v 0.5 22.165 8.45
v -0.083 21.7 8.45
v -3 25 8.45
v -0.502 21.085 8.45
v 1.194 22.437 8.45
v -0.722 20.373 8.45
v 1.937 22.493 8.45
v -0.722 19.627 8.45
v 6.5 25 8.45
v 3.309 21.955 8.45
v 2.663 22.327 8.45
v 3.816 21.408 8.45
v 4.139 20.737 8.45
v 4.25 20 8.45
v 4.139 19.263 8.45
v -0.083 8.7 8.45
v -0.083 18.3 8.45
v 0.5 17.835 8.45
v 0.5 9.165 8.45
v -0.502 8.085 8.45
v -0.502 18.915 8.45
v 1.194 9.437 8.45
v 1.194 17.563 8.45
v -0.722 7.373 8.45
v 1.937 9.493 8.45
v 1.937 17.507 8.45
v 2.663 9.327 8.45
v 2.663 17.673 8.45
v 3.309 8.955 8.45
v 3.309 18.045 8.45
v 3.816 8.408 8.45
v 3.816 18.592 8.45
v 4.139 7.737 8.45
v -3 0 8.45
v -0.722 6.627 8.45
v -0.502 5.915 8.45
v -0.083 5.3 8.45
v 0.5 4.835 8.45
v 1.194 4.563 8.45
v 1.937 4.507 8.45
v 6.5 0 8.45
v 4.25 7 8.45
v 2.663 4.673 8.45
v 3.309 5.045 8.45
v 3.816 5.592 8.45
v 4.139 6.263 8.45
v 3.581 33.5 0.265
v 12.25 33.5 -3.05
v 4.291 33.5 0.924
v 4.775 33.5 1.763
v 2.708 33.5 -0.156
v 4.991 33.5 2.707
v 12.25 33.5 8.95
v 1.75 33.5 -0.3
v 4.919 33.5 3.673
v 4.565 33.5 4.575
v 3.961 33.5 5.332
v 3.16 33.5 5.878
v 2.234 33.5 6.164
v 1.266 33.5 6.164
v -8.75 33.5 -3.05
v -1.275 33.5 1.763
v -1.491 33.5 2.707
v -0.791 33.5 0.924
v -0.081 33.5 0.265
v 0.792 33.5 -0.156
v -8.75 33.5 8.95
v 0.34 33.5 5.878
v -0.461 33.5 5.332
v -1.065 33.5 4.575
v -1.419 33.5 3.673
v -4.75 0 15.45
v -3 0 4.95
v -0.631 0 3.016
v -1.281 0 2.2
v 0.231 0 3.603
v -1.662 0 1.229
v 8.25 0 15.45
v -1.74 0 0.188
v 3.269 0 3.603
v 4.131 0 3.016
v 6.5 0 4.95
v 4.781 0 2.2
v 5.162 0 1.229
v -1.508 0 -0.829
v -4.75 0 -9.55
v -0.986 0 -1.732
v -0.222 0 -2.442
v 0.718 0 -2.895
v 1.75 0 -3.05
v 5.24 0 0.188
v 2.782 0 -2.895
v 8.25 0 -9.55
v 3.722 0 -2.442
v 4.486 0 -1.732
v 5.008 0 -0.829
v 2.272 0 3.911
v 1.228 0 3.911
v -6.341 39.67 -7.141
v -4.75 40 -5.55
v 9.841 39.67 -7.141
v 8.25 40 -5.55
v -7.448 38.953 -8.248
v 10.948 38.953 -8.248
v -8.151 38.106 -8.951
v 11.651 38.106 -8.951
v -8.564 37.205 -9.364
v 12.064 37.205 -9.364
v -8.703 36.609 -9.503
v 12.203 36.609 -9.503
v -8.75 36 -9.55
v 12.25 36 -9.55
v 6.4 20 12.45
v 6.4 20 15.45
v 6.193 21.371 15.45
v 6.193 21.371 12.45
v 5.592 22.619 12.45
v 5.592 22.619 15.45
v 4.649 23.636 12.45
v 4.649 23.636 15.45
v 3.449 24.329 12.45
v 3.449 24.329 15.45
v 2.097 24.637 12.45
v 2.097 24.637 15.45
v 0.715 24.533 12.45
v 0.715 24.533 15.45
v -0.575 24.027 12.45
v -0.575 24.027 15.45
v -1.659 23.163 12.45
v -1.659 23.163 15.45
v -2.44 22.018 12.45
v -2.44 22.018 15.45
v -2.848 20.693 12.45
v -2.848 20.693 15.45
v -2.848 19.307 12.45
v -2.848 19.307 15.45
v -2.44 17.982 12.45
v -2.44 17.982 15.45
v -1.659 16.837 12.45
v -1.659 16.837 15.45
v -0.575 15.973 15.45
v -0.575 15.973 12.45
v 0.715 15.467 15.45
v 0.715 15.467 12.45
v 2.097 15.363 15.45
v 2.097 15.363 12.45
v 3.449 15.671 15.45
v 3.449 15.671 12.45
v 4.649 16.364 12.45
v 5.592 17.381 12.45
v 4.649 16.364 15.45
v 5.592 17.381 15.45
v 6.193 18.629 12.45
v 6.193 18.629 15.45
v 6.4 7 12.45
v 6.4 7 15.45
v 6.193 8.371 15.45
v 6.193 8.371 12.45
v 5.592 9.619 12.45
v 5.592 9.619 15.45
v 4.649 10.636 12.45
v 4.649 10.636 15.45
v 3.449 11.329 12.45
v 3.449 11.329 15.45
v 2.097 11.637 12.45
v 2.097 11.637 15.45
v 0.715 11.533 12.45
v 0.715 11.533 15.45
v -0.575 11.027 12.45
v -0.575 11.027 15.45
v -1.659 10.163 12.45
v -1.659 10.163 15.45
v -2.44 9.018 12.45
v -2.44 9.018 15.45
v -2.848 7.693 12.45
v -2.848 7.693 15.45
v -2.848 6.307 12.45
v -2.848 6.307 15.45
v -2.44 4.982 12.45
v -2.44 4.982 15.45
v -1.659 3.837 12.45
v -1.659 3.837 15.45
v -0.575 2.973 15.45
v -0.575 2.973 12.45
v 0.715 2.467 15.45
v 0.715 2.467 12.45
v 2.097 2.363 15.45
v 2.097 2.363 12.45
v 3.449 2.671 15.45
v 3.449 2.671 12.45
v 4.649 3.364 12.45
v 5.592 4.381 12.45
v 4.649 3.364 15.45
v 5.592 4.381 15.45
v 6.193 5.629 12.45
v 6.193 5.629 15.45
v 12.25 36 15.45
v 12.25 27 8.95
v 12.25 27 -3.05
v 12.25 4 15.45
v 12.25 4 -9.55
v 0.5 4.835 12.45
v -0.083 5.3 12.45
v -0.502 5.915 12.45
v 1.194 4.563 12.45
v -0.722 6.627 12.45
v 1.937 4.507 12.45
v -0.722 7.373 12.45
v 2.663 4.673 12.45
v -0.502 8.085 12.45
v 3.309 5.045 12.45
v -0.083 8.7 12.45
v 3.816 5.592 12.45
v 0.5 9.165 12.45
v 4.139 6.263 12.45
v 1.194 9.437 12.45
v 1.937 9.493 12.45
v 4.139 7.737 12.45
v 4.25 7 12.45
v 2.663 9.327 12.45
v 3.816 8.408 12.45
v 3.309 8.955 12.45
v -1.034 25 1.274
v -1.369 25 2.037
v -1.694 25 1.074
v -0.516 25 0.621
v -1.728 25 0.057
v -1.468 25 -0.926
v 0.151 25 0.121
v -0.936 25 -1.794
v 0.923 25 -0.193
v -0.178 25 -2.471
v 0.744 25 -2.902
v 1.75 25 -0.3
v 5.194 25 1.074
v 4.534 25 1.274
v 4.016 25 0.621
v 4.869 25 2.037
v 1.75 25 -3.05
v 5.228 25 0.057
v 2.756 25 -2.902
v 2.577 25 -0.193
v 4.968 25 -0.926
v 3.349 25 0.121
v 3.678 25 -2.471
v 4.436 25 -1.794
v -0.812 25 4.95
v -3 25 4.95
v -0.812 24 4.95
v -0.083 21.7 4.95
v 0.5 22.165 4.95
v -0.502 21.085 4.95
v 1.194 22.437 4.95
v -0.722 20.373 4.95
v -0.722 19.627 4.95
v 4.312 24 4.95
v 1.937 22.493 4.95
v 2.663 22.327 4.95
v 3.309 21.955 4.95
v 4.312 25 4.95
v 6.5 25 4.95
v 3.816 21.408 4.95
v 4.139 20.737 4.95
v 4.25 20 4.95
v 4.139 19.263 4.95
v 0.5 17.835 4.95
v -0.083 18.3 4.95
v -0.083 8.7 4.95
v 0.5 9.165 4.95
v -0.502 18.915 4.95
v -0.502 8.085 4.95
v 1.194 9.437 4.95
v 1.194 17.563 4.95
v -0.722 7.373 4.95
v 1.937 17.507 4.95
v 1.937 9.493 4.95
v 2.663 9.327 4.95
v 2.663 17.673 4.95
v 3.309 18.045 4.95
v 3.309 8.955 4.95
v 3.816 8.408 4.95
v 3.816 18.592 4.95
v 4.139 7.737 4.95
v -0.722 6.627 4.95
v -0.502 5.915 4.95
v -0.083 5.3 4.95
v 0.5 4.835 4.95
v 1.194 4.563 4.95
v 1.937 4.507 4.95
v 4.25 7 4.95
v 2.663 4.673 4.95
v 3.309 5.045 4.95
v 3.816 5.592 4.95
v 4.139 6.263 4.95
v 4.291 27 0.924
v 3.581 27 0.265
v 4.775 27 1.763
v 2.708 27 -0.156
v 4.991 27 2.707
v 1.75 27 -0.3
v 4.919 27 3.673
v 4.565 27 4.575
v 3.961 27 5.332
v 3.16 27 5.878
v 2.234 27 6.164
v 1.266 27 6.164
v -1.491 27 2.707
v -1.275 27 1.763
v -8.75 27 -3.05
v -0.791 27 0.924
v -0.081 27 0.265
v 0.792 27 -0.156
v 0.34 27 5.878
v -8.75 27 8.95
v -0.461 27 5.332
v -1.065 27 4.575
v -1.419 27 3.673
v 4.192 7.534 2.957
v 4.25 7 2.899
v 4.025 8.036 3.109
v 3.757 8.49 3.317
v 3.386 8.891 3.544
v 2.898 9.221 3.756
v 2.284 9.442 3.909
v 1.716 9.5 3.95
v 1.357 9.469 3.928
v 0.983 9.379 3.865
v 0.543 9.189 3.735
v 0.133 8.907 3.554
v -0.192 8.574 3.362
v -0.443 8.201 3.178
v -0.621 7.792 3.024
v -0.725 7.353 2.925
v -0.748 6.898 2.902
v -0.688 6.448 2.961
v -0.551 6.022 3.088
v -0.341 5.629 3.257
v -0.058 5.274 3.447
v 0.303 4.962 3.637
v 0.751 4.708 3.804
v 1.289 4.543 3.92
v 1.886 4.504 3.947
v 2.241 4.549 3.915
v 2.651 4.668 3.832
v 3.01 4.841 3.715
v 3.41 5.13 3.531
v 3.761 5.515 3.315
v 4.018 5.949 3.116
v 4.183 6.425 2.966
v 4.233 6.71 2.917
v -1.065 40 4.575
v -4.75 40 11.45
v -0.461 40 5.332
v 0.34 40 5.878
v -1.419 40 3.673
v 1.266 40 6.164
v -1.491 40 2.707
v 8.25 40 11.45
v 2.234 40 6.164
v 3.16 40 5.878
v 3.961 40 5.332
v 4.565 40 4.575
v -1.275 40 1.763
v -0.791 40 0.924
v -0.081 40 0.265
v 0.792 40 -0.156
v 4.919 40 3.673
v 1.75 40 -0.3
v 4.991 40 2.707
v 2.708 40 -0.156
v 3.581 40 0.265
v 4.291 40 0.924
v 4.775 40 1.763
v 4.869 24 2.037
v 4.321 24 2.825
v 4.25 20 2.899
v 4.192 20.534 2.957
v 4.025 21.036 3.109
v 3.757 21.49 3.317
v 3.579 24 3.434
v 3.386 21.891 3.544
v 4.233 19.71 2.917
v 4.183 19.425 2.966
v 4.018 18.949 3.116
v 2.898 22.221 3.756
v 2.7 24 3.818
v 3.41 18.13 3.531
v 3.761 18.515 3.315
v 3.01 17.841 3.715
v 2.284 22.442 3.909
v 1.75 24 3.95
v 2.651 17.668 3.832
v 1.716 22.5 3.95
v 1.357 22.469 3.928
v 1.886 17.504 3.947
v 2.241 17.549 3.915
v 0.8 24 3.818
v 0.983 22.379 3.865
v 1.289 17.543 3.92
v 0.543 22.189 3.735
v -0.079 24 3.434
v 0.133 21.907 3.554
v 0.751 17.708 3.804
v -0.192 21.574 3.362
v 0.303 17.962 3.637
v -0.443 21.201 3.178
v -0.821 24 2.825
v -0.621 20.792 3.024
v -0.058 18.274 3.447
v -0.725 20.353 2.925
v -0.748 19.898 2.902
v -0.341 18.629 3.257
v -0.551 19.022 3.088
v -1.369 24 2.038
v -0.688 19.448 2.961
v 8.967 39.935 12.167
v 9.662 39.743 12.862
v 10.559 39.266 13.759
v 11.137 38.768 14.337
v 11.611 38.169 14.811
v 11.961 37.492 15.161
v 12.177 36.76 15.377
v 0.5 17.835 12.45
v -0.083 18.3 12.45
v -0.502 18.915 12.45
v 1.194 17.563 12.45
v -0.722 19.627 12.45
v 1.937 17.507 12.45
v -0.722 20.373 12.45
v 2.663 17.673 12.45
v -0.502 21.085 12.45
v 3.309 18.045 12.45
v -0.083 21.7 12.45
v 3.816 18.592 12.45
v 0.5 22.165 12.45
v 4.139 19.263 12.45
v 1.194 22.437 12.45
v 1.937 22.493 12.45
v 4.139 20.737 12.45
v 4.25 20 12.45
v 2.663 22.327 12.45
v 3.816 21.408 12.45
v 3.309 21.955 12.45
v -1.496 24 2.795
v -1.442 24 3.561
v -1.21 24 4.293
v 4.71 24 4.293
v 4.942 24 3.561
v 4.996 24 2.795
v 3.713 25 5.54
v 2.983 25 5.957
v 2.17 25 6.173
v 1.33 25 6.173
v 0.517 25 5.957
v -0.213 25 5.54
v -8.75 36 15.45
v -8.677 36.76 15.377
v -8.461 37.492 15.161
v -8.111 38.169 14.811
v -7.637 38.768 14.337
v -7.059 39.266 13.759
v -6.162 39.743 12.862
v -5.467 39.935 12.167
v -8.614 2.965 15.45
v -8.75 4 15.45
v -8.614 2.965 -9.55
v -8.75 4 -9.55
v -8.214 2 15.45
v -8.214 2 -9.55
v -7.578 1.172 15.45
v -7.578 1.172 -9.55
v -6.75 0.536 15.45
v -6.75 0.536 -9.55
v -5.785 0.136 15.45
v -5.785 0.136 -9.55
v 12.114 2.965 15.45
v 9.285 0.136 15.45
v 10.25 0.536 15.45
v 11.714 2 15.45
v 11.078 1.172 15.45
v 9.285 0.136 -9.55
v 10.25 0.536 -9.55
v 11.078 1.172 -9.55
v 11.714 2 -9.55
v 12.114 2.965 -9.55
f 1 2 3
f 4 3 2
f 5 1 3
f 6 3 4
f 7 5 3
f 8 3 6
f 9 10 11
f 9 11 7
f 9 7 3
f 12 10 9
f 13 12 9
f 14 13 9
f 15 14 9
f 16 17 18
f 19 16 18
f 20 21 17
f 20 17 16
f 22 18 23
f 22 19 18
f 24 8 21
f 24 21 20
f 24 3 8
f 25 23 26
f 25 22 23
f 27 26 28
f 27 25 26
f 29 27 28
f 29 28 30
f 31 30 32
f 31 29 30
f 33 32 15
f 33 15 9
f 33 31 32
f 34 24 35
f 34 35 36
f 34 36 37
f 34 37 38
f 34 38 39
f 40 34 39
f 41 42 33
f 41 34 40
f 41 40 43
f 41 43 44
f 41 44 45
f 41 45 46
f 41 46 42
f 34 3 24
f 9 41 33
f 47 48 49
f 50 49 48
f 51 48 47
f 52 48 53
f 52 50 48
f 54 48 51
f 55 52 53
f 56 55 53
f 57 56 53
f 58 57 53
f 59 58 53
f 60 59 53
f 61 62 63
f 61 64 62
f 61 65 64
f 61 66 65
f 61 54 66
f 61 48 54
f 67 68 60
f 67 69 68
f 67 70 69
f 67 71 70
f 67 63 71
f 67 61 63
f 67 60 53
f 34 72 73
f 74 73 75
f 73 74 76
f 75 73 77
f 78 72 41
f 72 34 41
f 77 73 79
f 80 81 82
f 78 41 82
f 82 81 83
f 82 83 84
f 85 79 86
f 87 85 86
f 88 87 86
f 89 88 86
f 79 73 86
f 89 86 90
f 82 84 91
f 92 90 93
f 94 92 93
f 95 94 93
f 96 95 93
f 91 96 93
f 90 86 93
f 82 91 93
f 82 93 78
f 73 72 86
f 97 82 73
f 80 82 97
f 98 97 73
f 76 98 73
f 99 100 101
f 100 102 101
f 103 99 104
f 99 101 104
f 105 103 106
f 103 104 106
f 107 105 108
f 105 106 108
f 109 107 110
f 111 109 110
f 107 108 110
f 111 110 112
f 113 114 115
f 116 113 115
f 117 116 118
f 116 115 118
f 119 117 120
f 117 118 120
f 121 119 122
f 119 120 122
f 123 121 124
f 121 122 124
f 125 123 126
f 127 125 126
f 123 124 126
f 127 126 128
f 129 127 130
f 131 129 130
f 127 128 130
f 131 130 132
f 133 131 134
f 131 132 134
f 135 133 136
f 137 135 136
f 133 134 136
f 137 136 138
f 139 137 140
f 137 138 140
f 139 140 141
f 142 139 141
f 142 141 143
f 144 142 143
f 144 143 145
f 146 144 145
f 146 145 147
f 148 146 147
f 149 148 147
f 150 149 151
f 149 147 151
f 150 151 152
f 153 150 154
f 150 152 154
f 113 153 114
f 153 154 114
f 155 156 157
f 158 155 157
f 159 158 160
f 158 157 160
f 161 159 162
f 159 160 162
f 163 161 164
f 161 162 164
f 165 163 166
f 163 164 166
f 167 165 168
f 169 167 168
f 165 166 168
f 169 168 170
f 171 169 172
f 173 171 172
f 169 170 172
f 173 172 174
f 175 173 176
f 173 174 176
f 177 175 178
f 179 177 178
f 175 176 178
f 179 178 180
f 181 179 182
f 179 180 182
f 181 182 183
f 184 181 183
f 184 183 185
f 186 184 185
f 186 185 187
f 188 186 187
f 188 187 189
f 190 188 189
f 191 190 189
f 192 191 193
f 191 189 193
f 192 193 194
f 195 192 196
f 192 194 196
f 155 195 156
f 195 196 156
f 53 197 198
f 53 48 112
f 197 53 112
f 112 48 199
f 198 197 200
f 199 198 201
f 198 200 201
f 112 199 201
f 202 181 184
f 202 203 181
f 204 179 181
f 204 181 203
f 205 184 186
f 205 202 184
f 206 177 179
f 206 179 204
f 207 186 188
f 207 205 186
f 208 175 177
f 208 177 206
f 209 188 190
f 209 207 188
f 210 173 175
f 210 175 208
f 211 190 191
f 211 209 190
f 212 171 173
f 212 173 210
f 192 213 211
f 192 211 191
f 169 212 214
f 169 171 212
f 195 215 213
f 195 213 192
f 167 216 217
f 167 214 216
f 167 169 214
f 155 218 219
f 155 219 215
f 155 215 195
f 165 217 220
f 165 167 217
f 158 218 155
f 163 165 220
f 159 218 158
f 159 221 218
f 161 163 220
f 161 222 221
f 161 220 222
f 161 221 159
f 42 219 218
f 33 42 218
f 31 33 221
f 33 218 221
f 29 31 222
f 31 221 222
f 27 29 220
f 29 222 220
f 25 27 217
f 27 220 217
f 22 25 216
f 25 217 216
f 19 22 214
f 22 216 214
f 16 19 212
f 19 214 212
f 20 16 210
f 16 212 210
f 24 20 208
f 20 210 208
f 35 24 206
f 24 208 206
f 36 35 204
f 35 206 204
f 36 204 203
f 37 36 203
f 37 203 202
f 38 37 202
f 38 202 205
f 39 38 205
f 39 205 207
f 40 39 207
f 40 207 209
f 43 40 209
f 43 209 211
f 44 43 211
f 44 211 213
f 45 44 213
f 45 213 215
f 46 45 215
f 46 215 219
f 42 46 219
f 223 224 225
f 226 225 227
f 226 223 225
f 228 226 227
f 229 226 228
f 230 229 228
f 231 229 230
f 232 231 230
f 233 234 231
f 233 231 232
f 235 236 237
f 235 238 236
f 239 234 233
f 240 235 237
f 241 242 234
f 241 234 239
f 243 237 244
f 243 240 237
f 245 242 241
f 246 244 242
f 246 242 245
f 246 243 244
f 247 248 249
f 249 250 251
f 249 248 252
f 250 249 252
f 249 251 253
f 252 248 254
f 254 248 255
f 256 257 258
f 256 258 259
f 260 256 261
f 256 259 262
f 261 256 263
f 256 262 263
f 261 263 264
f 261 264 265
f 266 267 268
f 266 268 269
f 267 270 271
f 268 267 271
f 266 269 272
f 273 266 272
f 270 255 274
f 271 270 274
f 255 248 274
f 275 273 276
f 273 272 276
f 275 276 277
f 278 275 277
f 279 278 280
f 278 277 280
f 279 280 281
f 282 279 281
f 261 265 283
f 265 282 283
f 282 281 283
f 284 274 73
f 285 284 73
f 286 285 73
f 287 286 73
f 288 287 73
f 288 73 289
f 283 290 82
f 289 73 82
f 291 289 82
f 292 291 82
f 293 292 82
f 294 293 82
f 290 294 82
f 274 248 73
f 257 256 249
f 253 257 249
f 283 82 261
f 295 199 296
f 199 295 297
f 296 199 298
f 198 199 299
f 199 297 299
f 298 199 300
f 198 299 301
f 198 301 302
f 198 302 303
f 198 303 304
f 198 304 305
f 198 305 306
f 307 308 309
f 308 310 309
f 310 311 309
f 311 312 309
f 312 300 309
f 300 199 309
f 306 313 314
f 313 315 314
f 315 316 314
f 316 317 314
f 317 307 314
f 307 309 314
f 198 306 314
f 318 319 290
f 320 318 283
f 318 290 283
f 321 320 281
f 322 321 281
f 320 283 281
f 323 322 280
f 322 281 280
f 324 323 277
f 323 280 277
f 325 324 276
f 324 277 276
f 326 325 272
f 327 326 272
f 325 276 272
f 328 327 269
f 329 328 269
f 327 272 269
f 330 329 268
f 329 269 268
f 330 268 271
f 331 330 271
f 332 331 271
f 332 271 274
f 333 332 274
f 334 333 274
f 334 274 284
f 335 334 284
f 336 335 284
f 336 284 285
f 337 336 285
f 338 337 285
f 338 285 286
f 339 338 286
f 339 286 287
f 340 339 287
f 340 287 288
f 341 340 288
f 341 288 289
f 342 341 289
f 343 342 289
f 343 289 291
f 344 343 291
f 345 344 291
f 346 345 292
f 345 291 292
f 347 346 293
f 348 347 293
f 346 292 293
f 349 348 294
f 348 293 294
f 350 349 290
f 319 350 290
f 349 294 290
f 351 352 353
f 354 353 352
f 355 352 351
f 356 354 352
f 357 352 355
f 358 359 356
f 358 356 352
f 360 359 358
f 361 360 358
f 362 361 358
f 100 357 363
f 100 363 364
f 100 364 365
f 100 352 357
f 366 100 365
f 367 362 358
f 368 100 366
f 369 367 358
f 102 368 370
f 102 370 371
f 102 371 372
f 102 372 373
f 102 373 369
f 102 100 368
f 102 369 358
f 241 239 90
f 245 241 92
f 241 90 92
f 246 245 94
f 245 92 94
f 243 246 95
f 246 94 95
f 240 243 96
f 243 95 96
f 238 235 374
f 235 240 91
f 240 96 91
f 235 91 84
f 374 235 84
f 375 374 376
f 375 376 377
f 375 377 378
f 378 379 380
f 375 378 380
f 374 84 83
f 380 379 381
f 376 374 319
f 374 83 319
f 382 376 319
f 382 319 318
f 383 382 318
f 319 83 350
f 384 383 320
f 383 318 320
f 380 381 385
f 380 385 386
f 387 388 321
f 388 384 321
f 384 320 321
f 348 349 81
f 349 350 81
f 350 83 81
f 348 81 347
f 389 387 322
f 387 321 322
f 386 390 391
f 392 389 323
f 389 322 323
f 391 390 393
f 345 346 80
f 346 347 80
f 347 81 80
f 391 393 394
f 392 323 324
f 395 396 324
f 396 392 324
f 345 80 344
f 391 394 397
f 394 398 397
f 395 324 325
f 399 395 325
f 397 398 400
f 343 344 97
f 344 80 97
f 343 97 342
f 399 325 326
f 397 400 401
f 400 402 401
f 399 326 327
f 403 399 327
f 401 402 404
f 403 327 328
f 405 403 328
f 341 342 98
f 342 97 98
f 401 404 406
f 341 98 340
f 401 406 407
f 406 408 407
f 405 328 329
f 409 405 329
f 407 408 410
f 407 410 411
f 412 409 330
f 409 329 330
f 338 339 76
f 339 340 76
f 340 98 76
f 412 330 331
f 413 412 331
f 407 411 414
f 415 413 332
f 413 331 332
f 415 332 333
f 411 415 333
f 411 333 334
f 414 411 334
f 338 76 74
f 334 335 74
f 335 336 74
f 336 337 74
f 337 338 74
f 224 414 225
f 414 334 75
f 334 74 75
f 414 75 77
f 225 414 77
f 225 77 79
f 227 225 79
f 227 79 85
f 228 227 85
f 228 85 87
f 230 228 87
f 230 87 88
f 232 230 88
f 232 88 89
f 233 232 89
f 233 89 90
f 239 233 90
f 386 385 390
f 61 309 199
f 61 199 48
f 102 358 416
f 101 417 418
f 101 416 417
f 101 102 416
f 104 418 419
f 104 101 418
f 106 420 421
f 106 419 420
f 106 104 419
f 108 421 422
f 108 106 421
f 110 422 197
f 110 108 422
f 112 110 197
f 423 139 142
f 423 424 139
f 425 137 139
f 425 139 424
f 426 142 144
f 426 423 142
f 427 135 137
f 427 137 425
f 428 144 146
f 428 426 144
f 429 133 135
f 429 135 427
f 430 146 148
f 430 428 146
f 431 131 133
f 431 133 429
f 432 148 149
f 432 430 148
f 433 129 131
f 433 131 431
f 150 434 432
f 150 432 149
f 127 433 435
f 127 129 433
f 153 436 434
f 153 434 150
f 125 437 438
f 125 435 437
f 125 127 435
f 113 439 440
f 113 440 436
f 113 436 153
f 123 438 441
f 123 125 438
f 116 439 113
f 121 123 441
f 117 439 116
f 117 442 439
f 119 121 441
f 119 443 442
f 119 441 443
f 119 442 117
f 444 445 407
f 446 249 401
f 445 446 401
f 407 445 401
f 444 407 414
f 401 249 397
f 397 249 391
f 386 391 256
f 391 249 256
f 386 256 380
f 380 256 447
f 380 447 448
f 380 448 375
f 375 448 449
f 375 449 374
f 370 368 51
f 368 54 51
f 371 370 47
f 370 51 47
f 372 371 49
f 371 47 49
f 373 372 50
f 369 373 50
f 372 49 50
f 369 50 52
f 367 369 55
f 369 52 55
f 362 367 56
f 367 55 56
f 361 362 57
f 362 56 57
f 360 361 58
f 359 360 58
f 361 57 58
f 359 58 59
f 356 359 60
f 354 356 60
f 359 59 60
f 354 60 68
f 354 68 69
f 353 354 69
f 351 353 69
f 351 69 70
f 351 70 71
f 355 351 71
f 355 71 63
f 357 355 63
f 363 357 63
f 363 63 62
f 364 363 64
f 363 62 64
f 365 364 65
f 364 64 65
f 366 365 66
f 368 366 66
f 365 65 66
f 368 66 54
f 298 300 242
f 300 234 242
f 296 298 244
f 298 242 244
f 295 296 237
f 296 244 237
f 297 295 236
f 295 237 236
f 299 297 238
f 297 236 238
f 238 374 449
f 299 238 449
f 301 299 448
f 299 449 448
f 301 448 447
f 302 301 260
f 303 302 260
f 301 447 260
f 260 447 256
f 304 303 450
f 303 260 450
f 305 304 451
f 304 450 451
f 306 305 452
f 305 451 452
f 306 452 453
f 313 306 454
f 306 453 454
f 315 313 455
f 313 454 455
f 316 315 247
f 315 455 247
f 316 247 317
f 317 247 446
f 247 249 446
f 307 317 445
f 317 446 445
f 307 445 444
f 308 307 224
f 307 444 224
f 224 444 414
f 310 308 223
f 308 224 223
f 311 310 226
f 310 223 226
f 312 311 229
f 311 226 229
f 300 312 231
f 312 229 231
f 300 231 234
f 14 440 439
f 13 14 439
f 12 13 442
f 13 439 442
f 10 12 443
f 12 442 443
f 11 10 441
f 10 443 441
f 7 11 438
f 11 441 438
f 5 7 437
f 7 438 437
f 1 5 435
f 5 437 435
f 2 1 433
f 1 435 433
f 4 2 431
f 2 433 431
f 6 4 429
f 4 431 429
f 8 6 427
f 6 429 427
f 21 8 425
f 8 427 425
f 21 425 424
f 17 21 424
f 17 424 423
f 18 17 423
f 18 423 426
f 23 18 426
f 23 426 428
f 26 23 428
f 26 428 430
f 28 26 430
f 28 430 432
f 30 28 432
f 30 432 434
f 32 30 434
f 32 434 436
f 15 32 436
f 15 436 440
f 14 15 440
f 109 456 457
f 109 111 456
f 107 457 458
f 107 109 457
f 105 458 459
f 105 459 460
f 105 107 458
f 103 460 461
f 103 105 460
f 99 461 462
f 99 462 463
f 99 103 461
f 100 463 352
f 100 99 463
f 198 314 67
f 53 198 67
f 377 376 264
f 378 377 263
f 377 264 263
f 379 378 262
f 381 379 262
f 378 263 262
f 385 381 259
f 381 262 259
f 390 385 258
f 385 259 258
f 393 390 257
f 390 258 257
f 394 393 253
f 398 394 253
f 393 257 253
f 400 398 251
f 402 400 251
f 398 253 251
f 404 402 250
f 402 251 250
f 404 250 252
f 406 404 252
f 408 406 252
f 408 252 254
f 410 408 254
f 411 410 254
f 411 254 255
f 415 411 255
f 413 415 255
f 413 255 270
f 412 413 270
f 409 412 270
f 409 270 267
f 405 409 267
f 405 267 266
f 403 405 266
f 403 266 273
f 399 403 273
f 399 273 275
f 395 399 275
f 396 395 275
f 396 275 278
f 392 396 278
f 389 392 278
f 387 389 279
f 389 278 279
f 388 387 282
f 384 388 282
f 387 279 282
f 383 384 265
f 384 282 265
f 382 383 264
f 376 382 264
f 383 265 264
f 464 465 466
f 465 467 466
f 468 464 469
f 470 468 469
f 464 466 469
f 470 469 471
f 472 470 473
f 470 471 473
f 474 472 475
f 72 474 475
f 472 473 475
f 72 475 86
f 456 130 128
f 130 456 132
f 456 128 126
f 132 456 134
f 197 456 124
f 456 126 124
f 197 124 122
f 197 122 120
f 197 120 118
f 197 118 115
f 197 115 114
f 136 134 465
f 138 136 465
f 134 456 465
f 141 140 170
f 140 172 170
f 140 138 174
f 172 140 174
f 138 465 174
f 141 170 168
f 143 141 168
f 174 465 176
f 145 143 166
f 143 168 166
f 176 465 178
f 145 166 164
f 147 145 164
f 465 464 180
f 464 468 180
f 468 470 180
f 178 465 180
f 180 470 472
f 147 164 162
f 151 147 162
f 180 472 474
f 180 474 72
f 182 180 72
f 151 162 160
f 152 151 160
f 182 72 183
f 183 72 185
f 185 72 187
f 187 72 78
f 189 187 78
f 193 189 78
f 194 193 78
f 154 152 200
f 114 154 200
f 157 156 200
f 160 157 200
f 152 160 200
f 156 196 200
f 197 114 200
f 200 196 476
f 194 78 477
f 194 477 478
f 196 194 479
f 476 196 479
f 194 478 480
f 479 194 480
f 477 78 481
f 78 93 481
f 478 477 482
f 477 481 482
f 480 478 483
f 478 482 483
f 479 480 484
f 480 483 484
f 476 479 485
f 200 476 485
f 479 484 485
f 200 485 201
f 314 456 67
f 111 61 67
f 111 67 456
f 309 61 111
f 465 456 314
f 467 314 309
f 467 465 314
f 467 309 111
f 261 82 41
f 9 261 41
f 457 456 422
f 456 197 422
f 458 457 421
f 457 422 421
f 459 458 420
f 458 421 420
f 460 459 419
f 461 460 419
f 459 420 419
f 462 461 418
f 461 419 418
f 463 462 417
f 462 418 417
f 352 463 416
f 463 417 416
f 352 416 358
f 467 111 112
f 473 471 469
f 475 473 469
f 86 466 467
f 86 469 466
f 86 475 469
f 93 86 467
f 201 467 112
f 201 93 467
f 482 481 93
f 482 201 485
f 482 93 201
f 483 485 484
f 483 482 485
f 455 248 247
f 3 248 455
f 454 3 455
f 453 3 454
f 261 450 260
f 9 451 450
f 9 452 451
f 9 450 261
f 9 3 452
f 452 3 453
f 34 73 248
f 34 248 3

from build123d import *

# Parameters (mm, degrees)
CROQUIS1_W                 = 21
CROQUIS1_H                 = 25
SALIENTE_EXTRUIR1_DEPTH    = 20
CROQUIS2_W                 = 21
CROQUIS2_H                 = 25
SALIENTE_EXTRUIR2_DEPTH    = 20
CORTAR_EXTRUIR1_REACH      = 49.746
CROQUIS3_W                 = 12
CROQUIS3_H                 = 6.5
CROQUIS5_R                 = 3.5
CROQUIS5_W                 = 9.5
CROQUIS5_H                 = 3.5
CORTAR_EXTRUIR3_DEPTH      = 25
CROQUIS6_R                 = 4.65
CORTAR_EXTRUIR4_DEPTH      = 3
CORTAR_EXTRUIR5_REACH      = 49.266
CORTAR_EXTRUIR5_END_RADIUS = 3.5
CROQUIS7_R                 = 2.5
REDONDEO4_R                = 4
CROQUIS8_R                 = 3.25
CORTAR_EXTRUIR6_DEPTH      = 9.5
REDONDEO5_R                = 4


with BuildPart() as part:
    # Croquis1 → Saliente-Extruir1 (new body)
    with BuildSketch(Plane(origin=(0, 0, 0), x_dir=(1, 0, 0), z_dir=(0, 1, 0))):
        with Locations((1.75, -2.95)):
            Rectangle(CROQUIS1_W, CROQUIS1_H)
    extrude(amount=SALIENTE_EXTRUIR1_DEPTH)

    # Croquis2 → Saliente-Extruir2 (add)
    with BuildSketch(Plane(origin=(0, 20, 0), x_dir=(1, 0, 0), z_dir=(0, 1, 0))):
        with Locations((1.75, -2.95)):
            Rectangle(CROQUIS2_W, CROQUIS2_H)
    extrude(amount=SALIENTE_EXTRUIR2_DEPTH)

    # Croquis3 → Cortar-Extruir1 (cut, up to next)
    with BuildSketch(Plane.ZY.offset(8.75), mode=Mode.PRIVATE) as cortar_extruir1_sk1:
        with Locations((2.95, 30.25)):
            Rectangle(CROQUIS3_W, CROQUIS3_H)
    cortar_extruir1_tool1 = extrude(cortar_extruir1_sk1.sketch, amount=-CORTAR_EXTRUIR1_REACH, mode=Mode.PRIVATE) & part.part
    add(cortar_extruir1_tool1.solids().sort_by_distance((-8.75, 30.25, 2.95))[0], mode=Mode.SUBTRACT)

    # Croquis5 → Cortar-Extruir3 (cut)
    with BuildSketch(Plane.XZ):
        with Locations(Location((1.75, 0.45, 0), (0, 0, 270))):
            Circle(CROQUIS5_R)
        with Locations((1.75, 6.7)):
            Rectangle(CROQUIS5_W, CROQUIS5_H)
    extrude(amount=-CORTAR_EXTRUIR3_DEPTH, mode=Mode.SUBTRACT)

    # Croquis6 → Cortar-Extruir4 (cut)
    with BuildSketch(Plane.XY.offset(15.45)):
        with Locations((1.75, 7)):
            Circle(CROQUIS6_R)
        with Locations((1.75, 20)):
            Circle(CROQUIS6_R)
    extrude(amount=-CORTAR_EXTRUIR4_DEPTH, mode=Mode.SUBTRACT)

    # Cortar-Extruir5: up to this cylinder (the profile starts outside it)
    cortar_extruir5_end = Plane(origin=(1.75, 13.5, 0.45), z_dir=(0, -1, 0)) * Cylinder(CORTAR_EXTRUIR5_END_RADIUS, 119.532, mode=Mode.PRIVATE)
    # Croquis7 → Cortar-Extruir5 (cut, up to the surface)
    with BuildSketch(Plane.XY.offset(12.45), mode=Mode.PRIVATE) as cortar_extruir5_sk1:
        with Locations((1.75, 20)):
            Circle(CROQUIS7_R)
    cortar_extruir5_tool1 = extrude(cortar_extruir5_sk1.sketch, amount=-CORTAR_EXTRUIR5_REACH, mode=Mode.PRIVATE) - cortar_extruir5_end
    add(cortar_extruir5_tool1.solids().sort_by_distance((1.75, 20, 12.45))[0], mode=Mode.SUBTRACT)
    # Croquis7 → Cortar-Extruir5 (cut, up to the surface)
    with BuildSketch(Plane.XY.offset(12.45), mode=Mode.PRIVATE) as cortar_extruir5_sk2:
        with Locations((1.75, 7)):
            Circle(CROQUIS7_R)
    cortar_extruir5_tool2 = extrude(cortar_extruir5_sk2.sketch, amount=-CORTAR_EXTRUIR5_REACH, mode=Mode.PRIVATE) - cortar_extruir5_end
    add(cortar_extruir5_tool2.solids().sort_by_distance((1.75, 7, 12.45))[0], mode=Mode.SUBTRACT)

    # Redondeo4
    redondeo4_edges = [part.edges().sort_by_distance(p)[0] for p in [
        (12.25, 0, 2.95),
        (-8.75, 0, 2.95),
    ]]
    fillet(redondeo4_edges, radius=REDONDEO4_R)

    # Croquis8 → Cortar-Extruir6 (cut, symmetric)
    with BuildSketch(Plane.XZ.offset(-33.5)):
        with Locations(Location((1.75, 2.95, 0), (0, 0, 270))):
            Circle(CROQUIS8_R)
    extrude(amount=CORTAR_EXTRUIR6_DEPTH, both=True, mode=Mode.SUBTRACT)

    # Redondeo5
    redondeo5_edges = [part.edges().sort_by_distance(p)[0] for p in [
        (1.75, 40, 15.45),
        (12.25, 40, 2.95),
        (1.75, 40, -9.55),
        (-8.75, 40, 2.95),
    ]]
    fillet(redondeo5_edges, radius=REDONDEO5_R)


solid = part.part
